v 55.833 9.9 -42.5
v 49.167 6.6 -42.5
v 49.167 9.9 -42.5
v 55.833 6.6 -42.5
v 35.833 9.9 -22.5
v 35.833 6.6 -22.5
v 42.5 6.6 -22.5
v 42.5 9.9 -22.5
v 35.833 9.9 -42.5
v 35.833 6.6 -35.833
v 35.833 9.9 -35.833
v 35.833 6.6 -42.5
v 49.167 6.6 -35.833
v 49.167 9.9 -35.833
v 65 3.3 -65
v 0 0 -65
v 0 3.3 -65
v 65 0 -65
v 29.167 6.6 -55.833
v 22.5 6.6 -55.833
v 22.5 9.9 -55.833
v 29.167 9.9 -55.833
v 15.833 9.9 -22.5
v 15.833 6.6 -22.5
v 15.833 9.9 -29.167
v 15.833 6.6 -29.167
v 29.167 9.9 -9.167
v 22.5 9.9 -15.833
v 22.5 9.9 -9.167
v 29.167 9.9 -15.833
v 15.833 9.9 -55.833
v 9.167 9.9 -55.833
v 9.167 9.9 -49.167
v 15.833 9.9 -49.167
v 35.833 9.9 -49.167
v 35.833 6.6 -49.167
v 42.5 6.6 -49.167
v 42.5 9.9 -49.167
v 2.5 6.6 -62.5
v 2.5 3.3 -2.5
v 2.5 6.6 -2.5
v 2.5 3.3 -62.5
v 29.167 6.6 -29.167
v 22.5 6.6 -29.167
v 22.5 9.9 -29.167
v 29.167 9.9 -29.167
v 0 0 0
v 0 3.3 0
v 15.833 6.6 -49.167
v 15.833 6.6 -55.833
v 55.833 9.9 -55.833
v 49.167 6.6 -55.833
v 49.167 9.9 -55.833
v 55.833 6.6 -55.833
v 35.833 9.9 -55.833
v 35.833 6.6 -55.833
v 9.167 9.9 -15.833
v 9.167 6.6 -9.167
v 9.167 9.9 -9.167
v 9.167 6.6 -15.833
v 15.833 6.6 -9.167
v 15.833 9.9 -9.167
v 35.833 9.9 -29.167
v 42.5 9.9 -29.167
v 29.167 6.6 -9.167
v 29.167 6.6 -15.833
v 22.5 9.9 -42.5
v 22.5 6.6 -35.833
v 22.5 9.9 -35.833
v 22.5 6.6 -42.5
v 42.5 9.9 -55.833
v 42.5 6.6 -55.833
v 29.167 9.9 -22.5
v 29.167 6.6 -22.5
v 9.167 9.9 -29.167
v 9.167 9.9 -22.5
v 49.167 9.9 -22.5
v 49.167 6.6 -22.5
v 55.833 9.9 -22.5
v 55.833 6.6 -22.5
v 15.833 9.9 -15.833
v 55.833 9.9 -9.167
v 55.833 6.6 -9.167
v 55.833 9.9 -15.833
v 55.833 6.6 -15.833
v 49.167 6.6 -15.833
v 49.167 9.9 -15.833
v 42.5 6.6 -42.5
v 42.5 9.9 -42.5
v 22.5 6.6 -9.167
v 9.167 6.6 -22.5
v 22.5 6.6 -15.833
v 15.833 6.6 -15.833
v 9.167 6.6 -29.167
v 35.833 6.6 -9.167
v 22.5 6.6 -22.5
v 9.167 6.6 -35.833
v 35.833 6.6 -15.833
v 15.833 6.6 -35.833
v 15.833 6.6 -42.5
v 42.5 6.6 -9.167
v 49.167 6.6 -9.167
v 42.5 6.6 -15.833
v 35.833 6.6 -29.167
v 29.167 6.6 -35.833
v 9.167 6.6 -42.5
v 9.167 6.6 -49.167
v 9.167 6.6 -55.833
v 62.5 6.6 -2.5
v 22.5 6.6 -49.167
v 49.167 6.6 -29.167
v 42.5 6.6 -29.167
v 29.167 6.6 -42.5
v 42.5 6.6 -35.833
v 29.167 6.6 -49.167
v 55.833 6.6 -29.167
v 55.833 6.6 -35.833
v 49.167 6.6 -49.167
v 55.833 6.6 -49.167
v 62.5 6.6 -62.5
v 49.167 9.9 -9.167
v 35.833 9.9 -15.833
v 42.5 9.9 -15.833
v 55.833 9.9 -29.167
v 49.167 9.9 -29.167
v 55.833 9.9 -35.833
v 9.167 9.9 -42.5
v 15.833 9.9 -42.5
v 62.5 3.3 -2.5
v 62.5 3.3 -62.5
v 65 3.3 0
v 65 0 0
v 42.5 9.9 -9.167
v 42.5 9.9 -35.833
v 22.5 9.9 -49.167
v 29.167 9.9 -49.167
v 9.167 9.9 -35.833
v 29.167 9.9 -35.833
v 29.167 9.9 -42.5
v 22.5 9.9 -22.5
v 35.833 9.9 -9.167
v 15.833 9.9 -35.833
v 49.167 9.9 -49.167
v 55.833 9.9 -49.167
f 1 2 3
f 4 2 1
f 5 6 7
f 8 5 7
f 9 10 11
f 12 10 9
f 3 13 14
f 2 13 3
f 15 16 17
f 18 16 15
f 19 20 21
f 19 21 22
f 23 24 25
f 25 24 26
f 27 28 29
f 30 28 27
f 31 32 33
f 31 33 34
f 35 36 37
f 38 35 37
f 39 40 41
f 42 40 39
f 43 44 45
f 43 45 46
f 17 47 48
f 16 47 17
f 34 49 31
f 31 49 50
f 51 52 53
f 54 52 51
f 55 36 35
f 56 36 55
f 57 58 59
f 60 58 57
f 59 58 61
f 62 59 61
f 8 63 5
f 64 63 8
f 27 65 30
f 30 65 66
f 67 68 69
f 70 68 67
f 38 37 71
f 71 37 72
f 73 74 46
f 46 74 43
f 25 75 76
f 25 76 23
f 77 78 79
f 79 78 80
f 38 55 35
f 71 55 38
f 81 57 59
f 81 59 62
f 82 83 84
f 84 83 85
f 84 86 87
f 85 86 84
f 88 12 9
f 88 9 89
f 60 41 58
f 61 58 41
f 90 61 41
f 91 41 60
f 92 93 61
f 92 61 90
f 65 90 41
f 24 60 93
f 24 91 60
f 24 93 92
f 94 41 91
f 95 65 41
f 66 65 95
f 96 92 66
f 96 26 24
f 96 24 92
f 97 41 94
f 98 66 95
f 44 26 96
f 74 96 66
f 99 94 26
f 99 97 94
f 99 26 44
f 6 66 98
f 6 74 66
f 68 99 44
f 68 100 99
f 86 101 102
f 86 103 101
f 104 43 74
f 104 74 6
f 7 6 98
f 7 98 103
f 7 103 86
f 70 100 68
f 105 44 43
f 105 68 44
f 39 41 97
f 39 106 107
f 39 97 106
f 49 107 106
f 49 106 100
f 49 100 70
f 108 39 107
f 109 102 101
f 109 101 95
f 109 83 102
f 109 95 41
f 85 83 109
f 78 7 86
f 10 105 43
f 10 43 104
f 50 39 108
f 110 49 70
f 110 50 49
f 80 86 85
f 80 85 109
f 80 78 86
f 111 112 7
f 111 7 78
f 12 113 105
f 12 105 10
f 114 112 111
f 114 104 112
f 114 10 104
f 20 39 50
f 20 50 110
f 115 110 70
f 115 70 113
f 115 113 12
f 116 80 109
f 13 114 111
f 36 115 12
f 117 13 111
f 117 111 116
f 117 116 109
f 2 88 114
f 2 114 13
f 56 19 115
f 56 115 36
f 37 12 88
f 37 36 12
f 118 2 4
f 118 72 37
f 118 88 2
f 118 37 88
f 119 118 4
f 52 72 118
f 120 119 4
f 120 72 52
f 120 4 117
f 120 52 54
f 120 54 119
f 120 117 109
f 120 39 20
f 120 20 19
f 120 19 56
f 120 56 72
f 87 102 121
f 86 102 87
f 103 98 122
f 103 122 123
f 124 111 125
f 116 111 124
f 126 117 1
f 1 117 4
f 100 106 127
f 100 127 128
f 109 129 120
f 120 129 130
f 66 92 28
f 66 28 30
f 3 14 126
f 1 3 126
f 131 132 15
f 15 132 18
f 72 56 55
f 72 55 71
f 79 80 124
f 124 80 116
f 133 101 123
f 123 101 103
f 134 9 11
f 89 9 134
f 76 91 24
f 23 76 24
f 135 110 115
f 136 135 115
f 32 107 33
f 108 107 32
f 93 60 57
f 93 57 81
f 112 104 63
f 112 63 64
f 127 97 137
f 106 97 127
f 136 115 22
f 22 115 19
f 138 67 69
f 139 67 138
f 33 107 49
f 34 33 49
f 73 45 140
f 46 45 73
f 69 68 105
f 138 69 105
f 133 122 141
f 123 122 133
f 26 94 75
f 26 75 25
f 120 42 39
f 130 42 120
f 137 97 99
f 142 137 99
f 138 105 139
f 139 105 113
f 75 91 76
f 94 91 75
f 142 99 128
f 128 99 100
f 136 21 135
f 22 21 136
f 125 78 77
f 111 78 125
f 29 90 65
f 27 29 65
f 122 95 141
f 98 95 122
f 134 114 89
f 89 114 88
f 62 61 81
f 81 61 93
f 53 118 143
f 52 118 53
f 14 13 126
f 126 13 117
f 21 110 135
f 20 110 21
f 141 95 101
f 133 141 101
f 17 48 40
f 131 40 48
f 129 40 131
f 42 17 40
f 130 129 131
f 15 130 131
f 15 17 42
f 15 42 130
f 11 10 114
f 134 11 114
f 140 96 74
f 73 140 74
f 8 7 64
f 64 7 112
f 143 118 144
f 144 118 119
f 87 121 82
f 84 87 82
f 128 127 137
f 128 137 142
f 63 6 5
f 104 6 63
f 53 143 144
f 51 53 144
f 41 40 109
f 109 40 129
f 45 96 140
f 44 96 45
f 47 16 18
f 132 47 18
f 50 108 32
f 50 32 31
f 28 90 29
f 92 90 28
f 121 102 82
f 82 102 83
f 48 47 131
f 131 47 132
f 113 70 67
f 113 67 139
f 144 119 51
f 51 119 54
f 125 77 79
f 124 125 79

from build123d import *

# Parameters (mm, degrees)
SKETCH1_W           = 65
SKETCH1_H           = 65
BOSS_EXTRUDE1_DEPTH = 3.3
SKETCH2_W           = 60
SKETCH2_H           = 60
BOSS_EXTRUDE2_DEPTH = 3.3
SKETCH3_W           = 6.666666666
SKETCH3_H           = 6.666666666
SKETCH3_W_2         = 6.666666667
BOSS_EXTRUDE3_DEPTH = 3.3
LPATTERN1_COUNT     = 4
LPATTERN1_PITCH     = 13.3333334


with BuildPart() as part:
    # Sketch1 → Boss-Extrude1 (new body)
    with BuildSketch(Plane(origin=(0, 0, 0), x_dir=(1, 0, 0), z_dir=(0, 1, 0))):
        with Locations((32.5, 32.5)):
            Rectangle(SKETCH1_W, SKETCH1_H)
    extrude(amount=BOSS_EXTRUDE1_DEPTH)

    # Sketch2 → Boss-Extrude2 (add)
    with BuildSketch(Plane(origin=(0, 3.3, 0), x_dir=(1, 0, 0), z_dir=(0, 1, 0))):
        with Locations((32.5, 32.5)):
            Rectangle(SKETCH2_W, SKETCH2_H)
    extrude(amount=BOSS_EXTRUDE2_DEPTH)

    # Sketch3 → Boss-Extrude3 (add)
    with BuildSketch(Plane(origin=(0, 6.6, 0), x_dir=(1, 0, 0), z_dir=(0, 1, 0))):
        with Locations((12.5, 52.5)):
            Rectangle(SKETCH3_W, SKETCH3_H)
        with Locations((25.833333334, 52.5)):
            Rectangle(SKETCH3_W_2, SKETCH3_H)
        with Locations((39.166666666, 52.5)):
            Rectangle(SKETCH3_W_2, SKETCH3_H)
        with Locations((52.5, 52.5)):
            Rectangle(SKETCH3_W, SKETCH3_H)
    boss_extrude3 = extrude(amount=BOSS_EXTRUDE3_DEPTH)

    # LPattern1: Boss-Extrude3 ×4
    with Locations(*[(0, 0, i * LPATTERN1_PITCH) for i in range(1, LPATTERN1_COUNT)]):
        add(boss_extrude3)


solid = part.part
